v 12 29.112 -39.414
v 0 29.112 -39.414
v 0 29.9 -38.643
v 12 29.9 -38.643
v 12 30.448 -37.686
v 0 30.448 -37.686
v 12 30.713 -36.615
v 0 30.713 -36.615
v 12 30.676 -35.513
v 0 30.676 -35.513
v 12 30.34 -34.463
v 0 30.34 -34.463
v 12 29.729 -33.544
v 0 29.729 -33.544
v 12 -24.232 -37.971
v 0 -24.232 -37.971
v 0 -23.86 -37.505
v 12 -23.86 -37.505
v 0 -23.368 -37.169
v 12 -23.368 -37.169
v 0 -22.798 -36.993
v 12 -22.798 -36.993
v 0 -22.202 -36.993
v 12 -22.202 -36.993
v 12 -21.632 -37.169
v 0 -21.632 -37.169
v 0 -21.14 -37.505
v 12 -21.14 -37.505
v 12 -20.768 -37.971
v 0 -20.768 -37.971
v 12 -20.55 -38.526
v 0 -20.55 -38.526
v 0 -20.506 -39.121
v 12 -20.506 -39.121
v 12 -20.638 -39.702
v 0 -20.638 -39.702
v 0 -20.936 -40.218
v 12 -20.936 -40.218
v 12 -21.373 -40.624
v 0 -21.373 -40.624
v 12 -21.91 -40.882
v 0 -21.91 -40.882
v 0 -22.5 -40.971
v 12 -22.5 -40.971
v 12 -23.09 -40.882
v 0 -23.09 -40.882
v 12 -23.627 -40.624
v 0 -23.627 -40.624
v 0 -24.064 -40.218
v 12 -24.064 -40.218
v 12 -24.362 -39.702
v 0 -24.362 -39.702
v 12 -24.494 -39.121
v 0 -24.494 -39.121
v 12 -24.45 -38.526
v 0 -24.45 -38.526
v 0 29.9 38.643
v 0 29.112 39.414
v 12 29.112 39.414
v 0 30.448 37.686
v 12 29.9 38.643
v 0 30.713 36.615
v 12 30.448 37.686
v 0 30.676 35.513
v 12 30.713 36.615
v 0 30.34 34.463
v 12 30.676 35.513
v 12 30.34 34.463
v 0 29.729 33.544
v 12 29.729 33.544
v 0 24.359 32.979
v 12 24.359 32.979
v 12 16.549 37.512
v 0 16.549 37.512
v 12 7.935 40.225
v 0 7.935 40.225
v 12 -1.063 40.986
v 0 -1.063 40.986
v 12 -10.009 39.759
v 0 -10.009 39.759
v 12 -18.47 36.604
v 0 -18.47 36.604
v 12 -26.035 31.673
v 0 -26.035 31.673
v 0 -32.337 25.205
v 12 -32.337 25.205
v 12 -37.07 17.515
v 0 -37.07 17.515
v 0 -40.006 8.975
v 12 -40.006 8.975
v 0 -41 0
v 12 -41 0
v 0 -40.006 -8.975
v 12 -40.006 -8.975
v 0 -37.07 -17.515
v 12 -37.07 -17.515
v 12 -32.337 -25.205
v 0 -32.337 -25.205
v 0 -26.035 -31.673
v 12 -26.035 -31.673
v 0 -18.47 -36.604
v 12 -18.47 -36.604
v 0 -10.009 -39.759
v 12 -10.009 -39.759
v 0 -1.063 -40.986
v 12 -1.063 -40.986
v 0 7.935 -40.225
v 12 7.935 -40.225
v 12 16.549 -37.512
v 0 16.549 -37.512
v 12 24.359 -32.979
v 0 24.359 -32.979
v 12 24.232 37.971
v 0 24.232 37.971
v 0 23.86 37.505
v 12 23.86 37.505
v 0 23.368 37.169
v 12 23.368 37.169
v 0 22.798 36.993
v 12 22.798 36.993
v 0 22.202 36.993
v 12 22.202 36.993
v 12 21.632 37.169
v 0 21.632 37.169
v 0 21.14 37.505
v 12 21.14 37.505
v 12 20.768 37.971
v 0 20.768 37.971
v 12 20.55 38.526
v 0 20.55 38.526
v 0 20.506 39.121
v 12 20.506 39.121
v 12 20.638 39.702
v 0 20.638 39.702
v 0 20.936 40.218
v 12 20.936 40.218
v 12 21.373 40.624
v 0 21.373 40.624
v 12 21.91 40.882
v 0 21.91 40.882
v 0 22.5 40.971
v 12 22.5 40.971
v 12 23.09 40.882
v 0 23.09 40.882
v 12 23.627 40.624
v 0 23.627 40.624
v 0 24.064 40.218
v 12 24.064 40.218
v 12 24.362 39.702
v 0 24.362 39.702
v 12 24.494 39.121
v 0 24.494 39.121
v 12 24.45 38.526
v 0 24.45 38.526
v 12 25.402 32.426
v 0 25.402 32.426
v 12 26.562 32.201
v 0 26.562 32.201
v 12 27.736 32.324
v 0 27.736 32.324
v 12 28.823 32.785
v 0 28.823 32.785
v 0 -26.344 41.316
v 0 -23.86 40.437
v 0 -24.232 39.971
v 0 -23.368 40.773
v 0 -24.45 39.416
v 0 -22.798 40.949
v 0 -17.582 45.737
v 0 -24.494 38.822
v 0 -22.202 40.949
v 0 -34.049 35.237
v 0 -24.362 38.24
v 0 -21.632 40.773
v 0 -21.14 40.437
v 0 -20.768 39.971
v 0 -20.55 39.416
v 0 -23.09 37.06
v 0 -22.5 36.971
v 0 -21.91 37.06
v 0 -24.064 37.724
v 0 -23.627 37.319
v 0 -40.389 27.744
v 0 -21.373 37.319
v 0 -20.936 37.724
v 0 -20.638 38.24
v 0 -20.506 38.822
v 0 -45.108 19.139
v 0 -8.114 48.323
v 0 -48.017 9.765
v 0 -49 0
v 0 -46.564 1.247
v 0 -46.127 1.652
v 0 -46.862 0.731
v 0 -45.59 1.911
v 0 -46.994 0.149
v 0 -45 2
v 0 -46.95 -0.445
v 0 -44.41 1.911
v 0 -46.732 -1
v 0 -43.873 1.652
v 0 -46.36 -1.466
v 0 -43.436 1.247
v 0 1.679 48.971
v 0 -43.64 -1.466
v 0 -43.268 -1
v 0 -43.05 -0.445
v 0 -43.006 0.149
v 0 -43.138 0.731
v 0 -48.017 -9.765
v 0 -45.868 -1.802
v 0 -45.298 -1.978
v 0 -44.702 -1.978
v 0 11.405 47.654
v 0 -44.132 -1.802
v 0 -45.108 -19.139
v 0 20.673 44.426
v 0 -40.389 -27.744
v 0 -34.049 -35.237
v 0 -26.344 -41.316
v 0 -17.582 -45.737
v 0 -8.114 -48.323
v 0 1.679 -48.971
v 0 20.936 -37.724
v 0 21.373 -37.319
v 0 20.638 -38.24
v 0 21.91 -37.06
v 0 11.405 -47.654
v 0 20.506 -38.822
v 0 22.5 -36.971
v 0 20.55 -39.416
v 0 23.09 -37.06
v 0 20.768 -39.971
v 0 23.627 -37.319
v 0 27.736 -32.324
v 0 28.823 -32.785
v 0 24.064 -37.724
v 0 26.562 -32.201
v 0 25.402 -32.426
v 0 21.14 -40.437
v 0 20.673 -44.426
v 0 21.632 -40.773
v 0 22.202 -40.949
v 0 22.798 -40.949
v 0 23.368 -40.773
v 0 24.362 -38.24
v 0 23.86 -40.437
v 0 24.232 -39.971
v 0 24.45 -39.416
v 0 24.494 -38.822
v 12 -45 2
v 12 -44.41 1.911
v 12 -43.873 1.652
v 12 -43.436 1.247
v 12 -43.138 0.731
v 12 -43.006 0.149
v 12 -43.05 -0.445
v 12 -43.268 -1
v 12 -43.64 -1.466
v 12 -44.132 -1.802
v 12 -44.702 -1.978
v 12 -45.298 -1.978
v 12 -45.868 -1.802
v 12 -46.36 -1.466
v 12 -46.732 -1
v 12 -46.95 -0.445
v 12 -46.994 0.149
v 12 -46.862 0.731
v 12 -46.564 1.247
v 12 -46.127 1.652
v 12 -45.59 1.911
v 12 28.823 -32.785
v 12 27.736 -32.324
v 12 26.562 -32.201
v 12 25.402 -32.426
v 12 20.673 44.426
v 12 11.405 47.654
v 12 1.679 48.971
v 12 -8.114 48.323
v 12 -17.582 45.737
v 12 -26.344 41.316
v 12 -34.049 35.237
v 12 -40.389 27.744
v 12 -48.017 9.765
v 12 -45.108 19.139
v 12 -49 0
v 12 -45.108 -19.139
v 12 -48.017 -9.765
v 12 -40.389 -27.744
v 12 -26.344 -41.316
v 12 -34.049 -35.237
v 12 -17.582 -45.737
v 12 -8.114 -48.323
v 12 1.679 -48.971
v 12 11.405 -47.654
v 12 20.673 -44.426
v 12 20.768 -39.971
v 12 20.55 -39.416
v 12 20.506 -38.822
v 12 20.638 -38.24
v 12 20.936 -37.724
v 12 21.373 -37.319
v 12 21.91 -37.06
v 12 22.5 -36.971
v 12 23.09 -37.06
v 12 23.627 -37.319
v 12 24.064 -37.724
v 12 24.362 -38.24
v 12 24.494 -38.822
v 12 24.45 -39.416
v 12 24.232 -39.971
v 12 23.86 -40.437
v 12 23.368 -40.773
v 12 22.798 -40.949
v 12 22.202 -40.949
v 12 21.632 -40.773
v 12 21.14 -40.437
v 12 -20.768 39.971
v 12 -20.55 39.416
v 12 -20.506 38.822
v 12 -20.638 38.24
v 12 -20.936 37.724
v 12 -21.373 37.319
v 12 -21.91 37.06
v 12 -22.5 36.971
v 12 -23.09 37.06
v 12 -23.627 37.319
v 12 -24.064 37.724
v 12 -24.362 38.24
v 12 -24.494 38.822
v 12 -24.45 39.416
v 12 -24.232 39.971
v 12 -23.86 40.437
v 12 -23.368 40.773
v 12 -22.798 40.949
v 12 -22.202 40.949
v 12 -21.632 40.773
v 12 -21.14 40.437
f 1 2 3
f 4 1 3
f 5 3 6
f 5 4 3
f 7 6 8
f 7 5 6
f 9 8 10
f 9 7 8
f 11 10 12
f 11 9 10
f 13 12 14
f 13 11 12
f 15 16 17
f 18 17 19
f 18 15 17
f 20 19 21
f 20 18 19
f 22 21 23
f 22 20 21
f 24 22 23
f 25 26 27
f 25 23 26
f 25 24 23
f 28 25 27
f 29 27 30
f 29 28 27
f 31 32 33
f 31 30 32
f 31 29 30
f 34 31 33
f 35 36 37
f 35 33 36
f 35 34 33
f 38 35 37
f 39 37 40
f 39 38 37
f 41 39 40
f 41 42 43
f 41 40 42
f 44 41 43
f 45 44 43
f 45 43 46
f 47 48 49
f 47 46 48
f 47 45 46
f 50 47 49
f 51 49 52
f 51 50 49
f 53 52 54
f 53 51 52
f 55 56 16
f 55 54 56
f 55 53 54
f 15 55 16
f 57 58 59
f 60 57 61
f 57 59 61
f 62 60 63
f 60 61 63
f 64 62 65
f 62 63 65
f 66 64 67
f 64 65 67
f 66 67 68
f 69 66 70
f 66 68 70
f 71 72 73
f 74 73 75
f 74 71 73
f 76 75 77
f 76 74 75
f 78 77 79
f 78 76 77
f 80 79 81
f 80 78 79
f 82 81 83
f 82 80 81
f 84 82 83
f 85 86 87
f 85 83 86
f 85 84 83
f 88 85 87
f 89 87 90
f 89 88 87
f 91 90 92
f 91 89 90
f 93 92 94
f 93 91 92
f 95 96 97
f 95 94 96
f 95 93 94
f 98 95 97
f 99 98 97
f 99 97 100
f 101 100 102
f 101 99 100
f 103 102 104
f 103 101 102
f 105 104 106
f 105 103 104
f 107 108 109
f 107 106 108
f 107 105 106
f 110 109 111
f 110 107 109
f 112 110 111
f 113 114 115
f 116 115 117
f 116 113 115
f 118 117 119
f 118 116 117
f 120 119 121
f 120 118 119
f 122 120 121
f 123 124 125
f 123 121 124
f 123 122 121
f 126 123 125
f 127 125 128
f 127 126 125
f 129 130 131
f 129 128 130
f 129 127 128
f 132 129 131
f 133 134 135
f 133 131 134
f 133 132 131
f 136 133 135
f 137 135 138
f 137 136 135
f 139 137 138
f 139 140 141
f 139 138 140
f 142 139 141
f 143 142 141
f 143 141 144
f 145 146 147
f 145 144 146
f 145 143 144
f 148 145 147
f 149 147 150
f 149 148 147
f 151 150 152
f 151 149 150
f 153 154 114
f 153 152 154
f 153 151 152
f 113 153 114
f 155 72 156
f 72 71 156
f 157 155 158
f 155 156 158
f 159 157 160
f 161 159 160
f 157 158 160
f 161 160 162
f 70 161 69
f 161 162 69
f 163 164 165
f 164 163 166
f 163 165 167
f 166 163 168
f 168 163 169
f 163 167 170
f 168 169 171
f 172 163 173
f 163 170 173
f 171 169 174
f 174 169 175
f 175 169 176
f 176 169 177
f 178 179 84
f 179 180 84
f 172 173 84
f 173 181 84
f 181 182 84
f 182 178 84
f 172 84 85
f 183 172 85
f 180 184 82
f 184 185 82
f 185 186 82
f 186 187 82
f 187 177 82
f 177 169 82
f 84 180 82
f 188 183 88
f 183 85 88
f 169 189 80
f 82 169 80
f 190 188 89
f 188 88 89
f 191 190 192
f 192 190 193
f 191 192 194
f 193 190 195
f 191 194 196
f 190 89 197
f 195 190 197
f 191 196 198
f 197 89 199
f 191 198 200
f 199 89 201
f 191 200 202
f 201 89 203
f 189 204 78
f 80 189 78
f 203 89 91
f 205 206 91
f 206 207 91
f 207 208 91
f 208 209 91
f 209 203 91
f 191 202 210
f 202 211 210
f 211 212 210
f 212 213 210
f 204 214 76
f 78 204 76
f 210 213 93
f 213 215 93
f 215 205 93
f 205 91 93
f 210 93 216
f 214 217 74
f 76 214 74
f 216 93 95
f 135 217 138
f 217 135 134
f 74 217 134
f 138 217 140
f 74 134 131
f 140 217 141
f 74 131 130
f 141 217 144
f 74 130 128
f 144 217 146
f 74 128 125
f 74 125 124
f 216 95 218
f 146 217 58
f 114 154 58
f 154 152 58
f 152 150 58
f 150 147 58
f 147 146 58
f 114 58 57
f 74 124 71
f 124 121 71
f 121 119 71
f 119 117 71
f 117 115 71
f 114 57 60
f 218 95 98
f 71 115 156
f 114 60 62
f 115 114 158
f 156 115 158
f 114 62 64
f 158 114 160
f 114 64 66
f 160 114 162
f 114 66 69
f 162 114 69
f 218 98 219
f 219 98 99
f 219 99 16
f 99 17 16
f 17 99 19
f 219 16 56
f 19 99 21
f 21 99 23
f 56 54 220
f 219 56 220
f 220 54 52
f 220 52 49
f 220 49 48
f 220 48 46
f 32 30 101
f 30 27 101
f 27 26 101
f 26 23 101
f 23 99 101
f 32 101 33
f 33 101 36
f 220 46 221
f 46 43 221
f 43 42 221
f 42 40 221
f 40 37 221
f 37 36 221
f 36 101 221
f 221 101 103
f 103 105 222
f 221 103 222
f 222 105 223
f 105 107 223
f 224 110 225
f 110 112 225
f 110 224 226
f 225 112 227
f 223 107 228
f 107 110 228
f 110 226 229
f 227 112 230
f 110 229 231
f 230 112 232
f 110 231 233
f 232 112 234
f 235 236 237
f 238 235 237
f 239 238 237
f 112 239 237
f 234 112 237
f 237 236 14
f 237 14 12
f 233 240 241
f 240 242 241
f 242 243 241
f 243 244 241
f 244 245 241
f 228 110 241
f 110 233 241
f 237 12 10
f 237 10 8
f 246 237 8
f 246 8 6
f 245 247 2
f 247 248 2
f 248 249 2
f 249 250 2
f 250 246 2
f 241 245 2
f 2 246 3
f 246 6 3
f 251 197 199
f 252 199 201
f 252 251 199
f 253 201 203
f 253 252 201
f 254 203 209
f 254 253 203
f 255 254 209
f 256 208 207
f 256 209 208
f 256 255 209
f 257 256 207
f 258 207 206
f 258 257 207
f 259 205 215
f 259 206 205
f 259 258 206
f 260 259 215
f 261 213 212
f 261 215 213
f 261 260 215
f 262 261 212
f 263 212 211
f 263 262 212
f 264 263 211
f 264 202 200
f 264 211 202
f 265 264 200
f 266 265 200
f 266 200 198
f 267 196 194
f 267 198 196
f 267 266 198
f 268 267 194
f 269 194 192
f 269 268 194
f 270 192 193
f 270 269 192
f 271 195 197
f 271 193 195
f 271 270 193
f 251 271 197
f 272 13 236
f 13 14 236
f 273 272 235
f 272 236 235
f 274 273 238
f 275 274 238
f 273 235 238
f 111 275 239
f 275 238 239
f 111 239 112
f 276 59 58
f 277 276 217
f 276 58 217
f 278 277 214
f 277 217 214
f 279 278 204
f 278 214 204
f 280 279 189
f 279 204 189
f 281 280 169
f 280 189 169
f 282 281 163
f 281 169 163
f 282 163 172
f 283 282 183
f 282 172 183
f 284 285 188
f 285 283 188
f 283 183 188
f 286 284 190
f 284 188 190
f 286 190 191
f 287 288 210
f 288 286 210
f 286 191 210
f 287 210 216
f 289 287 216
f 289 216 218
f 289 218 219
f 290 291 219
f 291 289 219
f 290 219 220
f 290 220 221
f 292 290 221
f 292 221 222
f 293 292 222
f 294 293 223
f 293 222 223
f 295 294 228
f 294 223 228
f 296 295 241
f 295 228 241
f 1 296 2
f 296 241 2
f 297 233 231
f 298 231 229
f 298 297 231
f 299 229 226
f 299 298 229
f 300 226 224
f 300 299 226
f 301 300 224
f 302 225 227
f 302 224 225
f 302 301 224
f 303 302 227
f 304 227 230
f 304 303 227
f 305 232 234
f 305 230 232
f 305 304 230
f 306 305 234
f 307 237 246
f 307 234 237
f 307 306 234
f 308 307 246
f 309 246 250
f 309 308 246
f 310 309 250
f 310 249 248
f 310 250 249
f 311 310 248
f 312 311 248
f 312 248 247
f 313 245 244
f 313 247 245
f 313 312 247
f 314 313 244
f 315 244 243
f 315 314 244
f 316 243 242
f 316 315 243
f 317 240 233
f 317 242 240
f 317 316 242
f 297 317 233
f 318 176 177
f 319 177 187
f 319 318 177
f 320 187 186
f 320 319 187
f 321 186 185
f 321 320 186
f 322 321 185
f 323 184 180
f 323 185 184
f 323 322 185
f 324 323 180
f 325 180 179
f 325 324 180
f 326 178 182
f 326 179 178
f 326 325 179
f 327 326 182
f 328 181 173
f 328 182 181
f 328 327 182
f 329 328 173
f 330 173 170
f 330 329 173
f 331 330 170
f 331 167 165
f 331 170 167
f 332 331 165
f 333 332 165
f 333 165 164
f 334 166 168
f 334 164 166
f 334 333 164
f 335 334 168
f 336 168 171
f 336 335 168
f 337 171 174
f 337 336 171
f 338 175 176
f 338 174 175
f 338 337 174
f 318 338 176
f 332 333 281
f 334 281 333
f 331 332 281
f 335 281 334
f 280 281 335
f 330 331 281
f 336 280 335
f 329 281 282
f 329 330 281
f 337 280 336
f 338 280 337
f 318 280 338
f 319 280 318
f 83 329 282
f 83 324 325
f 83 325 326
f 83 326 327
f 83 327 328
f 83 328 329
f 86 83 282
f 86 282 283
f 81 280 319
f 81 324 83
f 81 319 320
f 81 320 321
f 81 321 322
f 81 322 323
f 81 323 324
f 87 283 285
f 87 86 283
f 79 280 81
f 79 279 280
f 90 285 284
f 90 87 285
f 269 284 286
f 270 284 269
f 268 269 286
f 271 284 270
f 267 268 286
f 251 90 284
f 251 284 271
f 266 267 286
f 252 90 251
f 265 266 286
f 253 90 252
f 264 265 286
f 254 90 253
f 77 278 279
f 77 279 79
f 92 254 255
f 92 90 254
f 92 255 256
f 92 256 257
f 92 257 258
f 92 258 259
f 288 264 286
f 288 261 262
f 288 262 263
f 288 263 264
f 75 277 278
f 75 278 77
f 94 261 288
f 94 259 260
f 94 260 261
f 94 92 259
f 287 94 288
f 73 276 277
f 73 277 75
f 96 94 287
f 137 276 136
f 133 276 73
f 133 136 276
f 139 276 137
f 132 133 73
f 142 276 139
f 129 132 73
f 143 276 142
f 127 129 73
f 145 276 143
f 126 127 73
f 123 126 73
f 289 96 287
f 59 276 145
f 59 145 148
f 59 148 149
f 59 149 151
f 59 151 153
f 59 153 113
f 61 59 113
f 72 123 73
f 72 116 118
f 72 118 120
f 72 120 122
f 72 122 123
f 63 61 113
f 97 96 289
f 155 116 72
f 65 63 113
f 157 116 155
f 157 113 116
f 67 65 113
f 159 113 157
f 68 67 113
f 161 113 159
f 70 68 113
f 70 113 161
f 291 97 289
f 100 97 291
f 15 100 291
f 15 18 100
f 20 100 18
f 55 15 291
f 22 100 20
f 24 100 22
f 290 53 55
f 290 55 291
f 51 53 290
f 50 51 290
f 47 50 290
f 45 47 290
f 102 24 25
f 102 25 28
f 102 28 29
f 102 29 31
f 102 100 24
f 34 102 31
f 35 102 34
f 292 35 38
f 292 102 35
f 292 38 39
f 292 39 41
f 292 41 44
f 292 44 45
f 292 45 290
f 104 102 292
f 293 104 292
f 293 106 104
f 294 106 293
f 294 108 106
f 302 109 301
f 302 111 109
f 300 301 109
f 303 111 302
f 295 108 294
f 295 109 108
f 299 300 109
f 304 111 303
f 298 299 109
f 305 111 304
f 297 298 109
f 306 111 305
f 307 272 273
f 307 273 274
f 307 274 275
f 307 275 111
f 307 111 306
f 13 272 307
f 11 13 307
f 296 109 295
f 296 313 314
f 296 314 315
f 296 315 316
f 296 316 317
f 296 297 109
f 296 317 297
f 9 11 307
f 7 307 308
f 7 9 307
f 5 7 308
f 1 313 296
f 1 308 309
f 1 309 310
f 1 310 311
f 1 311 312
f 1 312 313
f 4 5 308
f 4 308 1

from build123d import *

# Parameters (mm, degrees)
SKETCH1_R           = 49
SKETCH1_R_2         = 41
BOSS_EXTRUDE1_DEPTH = 12
CIRPATTERN1_COUNT   = 6
CUT_EXTRUDE1_START  = -12
CUT_EXTRUDE1_DEPTH  = 12
FILLET1_R           = 4


with BuildPart() as part:
    # Sketch1 → Boss-Extrude1 (new body)
    with BuildSketch(Plane(origin=(0, 0, 0), x_dir=(0, 0, -1), z_dir=(1, 0, 0))):
        Circle(SKETCH1_R)
        Circle(SKETCH1_R_2, mode=Mode.SUBTRACT)
    extrude(amount=BOSS_EXTRUDE1_DEPTH)

    # Sketch3 → Ø4.0mm Dowel Hole1 (revolve, cut)
    with BuildSketch(Plane(origin=(12, 45, 0), x_dir=(0, 0, -1), z_dir=(0, 1, 0))):
        Polygon((0, 0), (0, 51.201721238), (2, 50), (2, 0), align=None)
    f_4_0mm_dowel_hole1 = revolve(axis=Axis((18.35, 45, 0), (-1, 0, 0)), mode=Mode.SUBTRACT)

    # CirPattern1: Ø4.0mm Dowel Hole1 ×6 about axis
    cirpattern1_axis = Axis((0, 0, 0), (1, 0, 0))
    for i in range(1, CIRPATTERN1_COUNT):
        add(f_4_0mm_dowel_hole1.rotate(cirpattern1_axis, i * 360 / CIRPATTERN1_COUNT), mode=Mode.SUBTRACT)

    # Sketch4 → Cut-Extrude1 (cut)
    with BuildSketch(Plane(origin=(12, 0, 0), x_dir=(0, 0, -1), z_dir=(1, 0, 0)).offset(CUT_EXTRUDE1_START)):
        with BuildLine():
            Line((-36.670833097, 32.5), (0, 0))
            Line((0, 0), (36.670833097, 32.5))
            ThreePointArc((36.670833097, 32.5), (0, 49), (-36.670833097, 32.5))
        make_face()
    extrude(amount=CUT_EXTRUDE1_DEPTH, mode=Mode.SUBTRACT)

    # Fillet1
    fillet1_edges = [part.edges().sort_by_distance(p)[0] for p in [
        (6, 32.5, -36.670833097),
        (6, 27.193877551, -30.683758305),
        (6, 27.193877551, 30.683758305),
        (6, 32.5, 36.670833097),
    ]]
    fillet(fillet1_edges, radius=FILLET1_R - 0.0001)  # a hair under: the kernel refuses the full size


solid = part.part
